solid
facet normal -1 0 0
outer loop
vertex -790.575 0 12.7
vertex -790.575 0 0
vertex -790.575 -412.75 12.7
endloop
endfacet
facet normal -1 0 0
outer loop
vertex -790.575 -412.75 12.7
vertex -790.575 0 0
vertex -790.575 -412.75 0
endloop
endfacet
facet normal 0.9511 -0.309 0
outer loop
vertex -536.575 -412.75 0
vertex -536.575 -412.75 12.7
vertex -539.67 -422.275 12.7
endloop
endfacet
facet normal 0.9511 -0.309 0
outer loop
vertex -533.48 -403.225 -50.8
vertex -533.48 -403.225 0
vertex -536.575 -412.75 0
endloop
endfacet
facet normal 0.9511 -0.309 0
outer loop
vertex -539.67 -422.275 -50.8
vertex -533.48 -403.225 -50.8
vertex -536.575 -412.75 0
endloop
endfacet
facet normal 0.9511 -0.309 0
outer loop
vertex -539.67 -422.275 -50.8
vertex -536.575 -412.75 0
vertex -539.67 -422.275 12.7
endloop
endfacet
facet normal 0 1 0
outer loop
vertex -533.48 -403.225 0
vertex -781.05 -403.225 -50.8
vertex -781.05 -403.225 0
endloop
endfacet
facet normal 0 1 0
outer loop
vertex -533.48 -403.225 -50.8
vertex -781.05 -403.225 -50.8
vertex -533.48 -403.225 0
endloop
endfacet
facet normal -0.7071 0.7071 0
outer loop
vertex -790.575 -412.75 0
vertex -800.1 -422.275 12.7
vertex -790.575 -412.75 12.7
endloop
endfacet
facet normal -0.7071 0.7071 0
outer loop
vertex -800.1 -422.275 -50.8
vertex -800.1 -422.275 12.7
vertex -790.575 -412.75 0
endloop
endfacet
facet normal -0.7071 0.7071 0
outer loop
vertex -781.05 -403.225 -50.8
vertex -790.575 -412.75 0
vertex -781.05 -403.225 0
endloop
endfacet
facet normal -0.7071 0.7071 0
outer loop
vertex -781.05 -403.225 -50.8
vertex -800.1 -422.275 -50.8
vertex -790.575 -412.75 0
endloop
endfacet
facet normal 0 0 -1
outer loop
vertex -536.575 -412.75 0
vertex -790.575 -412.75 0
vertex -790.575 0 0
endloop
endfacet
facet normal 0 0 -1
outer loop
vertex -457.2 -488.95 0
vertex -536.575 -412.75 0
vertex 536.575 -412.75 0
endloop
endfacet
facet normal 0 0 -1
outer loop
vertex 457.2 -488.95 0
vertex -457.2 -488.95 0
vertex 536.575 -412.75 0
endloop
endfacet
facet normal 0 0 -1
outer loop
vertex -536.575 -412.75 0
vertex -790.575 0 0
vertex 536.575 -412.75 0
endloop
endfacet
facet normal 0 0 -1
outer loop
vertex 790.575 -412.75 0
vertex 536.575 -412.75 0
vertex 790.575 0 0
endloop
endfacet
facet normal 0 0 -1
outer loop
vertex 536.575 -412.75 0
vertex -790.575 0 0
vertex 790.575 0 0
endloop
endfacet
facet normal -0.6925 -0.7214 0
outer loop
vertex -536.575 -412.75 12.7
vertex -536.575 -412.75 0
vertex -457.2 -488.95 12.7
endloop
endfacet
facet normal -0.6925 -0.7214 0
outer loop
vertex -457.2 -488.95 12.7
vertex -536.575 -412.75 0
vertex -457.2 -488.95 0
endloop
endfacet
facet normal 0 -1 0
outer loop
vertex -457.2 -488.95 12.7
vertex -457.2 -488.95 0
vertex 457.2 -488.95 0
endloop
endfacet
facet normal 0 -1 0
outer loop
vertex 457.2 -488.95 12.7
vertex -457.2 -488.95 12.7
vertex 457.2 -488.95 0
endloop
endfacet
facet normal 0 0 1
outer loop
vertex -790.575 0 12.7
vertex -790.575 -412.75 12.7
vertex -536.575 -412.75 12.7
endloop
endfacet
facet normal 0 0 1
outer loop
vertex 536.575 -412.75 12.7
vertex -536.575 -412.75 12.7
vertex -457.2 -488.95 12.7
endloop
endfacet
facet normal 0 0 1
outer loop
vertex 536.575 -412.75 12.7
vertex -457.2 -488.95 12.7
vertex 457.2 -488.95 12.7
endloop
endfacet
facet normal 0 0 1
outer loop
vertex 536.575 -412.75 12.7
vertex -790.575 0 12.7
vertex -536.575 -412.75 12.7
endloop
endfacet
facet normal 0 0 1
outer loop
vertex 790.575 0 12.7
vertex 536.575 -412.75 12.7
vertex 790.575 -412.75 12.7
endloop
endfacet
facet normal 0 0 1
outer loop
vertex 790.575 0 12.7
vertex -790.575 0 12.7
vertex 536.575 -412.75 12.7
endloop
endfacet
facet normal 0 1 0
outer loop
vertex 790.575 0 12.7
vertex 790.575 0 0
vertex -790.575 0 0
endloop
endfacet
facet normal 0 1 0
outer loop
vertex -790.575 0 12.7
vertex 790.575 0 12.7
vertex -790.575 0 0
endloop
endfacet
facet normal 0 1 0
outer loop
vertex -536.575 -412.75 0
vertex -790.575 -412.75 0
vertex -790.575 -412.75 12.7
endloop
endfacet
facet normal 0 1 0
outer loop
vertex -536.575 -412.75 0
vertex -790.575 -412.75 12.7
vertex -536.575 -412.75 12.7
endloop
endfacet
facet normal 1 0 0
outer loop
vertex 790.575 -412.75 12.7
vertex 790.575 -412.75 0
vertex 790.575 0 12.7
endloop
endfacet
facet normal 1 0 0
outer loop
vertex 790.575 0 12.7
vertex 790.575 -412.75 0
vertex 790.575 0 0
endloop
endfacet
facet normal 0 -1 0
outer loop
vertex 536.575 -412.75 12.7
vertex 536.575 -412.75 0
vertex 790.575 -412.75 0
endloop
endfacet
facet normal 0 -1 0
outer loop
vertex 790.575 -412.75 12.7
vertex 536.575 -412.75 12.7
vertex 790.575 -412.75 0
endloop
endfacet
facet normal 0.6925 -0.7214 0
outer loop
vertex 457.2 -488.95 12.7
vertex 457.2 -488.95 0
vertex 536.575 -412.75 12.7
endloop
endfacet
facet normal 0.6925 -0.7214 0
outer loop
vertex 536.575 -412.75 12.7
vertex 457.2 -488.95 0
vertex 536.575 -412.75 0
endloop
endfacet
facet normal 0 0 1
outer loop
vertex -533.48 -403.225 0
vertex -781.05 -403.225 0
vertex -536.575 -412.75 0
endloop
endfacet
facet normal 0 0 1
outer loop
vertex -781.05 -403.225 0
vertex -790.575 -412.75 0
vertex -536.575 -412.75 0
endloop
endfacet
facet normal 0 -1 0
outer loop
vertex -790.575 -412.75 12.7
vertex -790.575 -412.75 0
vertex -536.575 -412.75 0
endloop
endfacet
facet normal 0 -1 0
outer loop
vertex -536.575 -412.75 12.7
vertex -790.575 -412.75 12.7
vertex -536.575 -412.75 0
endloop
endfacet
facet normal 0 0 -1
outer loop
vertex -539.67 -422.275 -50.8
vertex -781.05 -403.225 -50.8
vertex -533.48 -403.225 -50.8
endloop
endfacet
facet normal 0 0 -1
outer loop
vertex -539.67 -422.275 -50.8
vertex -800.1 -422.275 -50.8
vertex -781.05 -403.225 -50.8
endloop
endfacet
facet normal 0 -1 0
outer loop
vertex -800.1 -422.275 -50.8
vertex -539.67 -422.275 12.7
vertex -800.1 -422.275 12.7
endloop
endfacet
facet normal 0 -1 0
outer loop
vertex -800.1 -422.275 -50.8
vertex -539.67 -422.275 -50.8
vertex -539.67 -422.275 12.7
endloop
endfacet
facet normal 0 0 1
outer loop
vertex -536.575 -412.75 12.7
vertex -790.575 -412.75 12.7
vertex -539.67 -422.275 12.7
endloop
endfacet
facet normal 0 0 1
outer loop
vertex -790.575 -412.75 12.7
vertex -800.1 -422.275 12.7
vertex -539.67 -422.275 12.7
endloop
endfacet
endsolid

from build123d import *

# Parameters (mm, degrees)
F1_DEPTH      = 12.7
F3_DEPTH      = 50.8
F3_DEPTH_BACK = 12.7
F5_DEPTH      = 50.8


with BuildPart() as f1:
    # F0 (on Top) → F1 (new body)
    with BuildSketch(Plane.XY):
        Polygon((790.575, 0), (-790.575, 0), (-790.575, -412.75), (-536.575, -412.75), (-457.2, -488.95), (457.2, -488.95), (536.575, -412.75), (790.575, -412.75), align=None)
    extrude(amount=F1_DEPTH)


with BuildPart() as f3:
    # F2 (on face) → F3 (new body, two sides)
    with BuildSketch(Plane(origin=(0, 0, 0), x_dir=(1, 0, 0), z_dir=(0, 0, -1))) as f3_sk:
        Polygon((-800.1, 422.275), (-790.575, 412.75), (-536.575, 412.75), (-539.6698601066, 422.275), align=None)
    extrude(amount=F3_DEPTH)
    extrude(f3_sk.sketch, amount=-F3_DEPTH_BACK)

    # F4 (on face) → F5 (join)
    with BuildSketch(Plane(origin=(0, 0, -50.8), x_dir=(1, 0, 0), z_dir=(0, 0, -1))):
        Polygon((-536.575, 412.75), (-790.575, 412.75), (-781.05, 403.225), (-533.4801398934, 403.225), align=None)
    extrude(amount=-F5_DEPTH)


solid = Compound([f1.part, f3.part])
